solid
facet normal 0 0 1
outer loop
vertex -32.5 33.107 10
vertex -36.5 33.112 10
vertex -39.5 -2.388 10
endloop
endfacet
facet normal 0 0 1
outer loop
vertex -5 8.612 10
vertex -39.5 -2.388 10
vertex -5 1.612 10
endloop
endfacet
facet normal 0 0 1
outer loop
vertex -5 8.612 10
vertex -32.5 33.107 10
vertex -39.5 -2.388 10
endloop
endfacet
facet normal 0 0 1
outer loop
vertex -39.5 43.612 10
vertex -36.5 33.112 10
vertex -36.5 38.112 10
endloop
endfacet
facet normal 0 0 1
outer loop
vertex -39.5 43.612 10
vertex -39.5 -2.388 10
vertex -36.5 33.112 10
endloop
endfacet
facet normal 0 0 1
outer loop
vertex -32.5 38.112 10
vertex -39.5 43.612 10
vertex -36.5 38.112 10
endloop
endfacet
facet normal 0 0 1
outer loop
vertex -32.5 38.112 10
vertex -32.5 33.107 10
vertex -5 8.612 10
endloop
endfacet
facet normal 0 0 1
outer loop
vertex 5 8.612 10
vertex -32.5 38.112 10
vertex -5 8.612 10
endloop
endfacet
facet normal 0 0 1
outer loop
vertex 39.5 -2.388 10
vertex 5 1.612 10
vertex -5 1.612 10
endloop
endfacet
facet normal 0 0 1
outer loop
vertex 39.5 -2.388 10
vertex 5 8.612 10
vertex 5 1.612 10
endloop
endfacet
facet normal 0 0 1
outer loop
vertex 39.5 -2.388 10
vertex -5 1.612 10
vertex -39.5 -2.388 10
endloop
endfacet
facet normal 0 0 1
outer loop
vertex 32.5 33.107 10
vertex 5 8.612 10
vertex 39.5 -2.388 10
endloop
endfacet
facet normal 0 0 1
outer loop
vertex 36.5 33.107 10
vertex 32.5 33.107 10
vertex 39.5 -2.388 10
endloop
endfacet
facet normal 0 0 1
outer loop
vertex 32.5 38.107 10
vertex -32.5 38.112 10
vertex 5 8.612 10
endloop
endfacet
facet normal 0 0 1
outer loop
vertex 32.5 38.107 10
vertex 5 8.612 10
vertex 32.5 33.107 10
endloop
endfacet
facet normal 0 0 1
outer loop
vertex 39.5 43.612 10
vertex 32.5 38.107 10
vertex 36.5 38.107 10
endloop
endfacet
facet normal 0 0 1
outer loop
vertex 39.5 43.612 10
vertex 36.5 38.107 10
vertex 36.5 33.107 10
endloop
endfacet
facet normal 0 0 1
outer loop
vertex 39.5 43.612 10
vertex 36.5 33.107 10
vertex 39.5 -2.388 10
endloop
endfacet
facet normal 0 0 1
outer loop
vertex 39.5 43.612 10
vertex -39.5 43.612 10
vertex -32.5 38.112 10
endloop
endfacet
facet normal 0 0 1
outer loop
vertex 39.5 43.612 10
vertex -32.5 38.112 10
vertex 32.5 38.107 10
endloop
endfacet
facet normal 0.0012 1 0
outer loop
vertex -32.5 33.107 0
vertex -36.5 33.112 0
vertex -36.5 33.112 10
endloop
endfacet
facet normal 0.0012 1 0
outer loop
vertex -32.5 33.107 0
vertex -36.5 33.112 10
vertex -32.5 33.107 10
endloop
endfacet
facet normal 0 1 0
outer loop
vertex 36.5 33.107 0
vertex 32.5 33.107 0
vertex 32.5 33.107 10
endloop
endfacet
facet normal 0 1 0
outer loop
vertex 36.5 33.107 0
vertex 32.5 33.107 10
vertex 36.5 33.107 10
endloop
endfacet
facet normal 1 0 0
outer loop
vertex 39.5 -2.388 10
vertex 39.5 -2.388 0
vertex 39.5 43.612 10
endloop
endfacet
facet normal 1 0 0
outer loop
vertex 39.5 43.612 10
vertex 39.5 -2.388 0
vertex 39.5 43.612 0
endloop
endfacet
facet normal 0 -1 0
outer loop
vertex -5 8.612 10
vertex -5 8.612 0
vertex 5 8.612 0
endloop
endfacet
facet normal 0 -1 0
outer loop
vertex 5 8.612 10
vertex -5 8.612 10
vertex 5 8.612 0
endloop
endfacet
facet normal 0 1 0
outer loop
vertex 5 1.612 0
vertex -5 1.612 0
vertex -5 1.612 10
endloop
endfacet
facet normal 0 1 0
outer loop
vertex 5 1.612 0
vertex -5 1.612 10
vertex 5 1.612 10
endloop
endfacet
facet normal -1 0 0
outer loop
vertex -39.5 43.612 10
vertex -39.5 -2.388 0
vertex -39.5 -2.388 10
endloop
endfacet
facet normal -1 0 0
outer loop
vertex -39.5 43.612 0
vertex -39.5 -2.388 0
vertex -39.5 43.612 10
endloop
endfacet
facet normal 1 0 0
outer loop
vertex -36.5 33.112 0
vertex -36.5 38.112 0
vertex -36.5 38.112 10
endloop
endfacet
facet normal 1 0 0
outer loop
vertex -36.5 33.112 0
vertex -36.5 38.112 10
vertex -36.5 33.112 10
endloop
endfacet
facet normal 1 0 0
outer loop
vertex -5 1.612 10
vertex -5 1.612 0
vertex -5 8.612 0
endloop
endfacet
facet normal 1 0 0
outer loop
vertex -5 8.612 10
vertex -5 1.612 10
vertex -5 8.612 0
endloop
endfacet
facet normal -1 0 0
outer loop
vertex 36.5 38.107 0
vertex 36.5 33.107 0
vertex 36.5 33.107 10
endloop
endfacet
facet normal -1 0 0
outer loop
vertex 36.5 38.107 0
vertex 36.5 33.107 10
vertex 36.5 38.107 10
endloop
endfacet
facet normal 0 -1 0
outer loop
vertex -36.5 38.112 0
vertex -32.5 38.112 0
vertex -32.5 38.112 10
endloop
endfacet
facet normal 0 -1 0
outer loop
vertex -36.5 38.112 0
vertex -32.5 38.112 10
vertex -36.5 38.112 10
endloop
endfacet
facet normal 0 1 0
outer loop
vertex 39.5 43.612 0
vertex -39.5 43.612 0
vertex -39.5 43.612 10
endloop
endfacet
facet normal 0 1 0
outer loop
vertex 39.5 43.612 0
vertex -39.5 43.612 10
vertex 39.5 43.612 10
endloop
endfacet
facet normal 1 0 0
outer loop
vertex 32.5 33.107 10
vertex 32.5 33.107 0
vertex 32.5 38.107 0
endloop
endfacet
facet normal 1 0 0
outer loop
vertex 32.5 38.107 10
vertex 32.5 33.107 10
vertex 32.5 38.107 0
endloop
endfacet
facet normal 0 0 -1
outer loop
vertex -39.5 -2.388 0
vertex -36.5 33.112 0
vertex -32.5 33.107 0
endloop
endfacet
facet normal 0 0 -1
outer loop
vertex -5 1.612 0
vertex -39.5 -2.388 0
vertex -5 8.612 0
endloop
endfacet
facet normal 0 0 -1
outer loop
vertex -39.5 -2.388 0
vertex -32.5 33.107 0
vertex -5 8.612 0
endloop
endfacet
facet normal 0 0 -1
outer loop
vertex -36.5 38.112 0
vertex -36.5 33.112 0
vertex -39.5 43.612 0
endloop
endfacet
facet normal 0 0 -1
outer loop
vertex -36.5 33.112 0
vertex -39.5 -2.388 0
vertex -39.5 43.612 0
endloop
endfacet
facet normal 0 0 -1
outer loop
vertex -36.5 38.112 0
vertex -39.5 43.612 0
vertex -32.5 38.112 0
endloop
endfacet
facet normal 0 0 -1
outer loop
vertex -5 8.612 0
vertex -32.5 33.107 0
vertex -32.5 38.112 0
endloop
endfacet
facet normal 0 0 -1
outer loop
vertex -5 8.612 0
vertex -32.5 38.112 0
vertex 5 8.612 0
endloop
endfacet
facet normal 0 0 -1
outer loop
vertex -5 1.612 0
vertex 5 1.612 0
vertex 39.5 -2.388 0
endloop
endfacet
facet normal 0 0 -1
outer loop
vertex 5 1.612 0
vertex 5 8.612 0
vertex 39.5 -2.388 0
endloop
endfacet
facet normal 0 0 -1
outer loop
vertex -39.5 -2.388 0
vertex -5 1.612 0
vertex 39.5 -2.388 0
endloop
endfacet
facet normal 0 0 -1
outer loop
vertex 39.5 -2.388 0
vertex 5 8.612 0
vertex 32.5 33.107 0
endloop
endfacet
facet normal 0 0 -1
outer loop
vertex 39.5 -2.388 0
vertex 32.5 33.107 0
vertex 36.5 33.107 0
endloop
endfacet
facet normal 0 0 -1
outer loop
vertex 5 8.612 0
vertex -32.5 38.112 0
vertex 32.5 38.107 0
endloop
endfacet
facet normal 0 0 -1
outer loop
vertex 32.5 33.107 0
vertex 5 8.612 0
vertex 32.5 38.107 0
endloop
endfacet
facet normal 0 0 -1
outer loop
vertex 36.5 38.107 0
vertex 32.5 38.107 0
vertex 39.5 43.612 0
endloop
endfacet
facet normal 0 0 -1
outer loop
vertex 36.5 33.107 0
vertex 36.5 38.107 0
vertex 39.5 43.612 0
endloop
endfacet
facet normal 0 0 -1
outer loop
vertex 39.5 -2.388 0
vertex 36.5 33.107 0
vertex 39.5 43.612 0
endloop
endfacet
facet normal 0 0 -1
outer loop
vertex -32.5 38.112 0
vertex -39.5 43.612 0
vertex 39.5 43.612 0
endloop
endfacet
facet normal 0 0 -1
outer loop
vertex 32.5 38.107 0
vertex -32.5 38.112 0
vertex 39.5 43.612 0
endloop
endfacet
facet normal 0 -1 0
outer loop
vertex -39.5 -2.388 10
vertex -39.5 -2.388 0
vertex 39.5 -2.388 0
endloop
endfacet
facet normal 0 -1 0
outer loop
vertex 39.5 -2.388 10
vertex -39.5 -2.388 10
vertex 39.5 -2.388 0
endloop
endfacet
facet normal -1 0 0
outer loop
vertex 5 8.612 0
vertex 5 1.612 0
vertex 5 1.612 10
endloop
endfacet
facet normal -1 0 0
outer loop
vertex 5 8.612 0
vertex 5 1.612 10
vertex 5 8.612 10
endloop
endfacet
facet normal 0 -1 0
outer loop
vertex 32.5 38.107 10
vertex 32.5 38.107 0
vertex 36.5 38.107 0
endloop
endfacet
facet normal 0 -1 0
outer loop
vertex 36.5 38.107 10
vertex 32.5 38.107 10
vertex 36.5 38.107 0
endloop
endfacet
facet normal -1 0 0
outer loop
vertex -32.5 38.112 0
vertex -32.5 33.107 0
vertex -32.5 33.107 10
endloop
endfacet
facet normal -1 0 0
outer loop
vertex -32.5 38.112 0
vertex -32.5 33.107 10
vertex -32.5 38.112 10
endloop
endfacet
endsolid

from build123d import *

# Parameters (mm, degrees)
SKETCH1_W           = 79
SKETCH1_H           = 46
SKETCH1_W_2         = 10
SKETCH1_H_2         = 7
SKETCH1_W_3         = 4
SKETCH1_H_3         = 5
BOSS_EXTRUDE1_DEPTH = 10


with BuildPart() as part:
    # Sketch1 → Boss-Extrude1 (new body)
    with BuildSketch(Plane.XY):
        with Locations((0, 20.611542264)):
            Rectangle(SKETCH1_W, SKETCH1_H)
        Polygon((-32.5, 38.111542264), (-36.5, 38.111542264), (-36.5, 33.111542264), (-32.5, 33.107370015), align=None, mode=Mode.SUBTRACT)
        with Locations((0, 5.111542264)):
            Rectangle(SKETCH1_W_2, SKETCH1_H_2, mode=Mode.SUBTRACT)
        with Locations((34.5, 35.607370015)):
            Rectangle(SKETCH1_W_3, SKETCH1_H_3, mode=Mode.SUBTRACT)
    extrude(amount=BOSS_EXTRUDE1_DEPTH)


solid = part.part
